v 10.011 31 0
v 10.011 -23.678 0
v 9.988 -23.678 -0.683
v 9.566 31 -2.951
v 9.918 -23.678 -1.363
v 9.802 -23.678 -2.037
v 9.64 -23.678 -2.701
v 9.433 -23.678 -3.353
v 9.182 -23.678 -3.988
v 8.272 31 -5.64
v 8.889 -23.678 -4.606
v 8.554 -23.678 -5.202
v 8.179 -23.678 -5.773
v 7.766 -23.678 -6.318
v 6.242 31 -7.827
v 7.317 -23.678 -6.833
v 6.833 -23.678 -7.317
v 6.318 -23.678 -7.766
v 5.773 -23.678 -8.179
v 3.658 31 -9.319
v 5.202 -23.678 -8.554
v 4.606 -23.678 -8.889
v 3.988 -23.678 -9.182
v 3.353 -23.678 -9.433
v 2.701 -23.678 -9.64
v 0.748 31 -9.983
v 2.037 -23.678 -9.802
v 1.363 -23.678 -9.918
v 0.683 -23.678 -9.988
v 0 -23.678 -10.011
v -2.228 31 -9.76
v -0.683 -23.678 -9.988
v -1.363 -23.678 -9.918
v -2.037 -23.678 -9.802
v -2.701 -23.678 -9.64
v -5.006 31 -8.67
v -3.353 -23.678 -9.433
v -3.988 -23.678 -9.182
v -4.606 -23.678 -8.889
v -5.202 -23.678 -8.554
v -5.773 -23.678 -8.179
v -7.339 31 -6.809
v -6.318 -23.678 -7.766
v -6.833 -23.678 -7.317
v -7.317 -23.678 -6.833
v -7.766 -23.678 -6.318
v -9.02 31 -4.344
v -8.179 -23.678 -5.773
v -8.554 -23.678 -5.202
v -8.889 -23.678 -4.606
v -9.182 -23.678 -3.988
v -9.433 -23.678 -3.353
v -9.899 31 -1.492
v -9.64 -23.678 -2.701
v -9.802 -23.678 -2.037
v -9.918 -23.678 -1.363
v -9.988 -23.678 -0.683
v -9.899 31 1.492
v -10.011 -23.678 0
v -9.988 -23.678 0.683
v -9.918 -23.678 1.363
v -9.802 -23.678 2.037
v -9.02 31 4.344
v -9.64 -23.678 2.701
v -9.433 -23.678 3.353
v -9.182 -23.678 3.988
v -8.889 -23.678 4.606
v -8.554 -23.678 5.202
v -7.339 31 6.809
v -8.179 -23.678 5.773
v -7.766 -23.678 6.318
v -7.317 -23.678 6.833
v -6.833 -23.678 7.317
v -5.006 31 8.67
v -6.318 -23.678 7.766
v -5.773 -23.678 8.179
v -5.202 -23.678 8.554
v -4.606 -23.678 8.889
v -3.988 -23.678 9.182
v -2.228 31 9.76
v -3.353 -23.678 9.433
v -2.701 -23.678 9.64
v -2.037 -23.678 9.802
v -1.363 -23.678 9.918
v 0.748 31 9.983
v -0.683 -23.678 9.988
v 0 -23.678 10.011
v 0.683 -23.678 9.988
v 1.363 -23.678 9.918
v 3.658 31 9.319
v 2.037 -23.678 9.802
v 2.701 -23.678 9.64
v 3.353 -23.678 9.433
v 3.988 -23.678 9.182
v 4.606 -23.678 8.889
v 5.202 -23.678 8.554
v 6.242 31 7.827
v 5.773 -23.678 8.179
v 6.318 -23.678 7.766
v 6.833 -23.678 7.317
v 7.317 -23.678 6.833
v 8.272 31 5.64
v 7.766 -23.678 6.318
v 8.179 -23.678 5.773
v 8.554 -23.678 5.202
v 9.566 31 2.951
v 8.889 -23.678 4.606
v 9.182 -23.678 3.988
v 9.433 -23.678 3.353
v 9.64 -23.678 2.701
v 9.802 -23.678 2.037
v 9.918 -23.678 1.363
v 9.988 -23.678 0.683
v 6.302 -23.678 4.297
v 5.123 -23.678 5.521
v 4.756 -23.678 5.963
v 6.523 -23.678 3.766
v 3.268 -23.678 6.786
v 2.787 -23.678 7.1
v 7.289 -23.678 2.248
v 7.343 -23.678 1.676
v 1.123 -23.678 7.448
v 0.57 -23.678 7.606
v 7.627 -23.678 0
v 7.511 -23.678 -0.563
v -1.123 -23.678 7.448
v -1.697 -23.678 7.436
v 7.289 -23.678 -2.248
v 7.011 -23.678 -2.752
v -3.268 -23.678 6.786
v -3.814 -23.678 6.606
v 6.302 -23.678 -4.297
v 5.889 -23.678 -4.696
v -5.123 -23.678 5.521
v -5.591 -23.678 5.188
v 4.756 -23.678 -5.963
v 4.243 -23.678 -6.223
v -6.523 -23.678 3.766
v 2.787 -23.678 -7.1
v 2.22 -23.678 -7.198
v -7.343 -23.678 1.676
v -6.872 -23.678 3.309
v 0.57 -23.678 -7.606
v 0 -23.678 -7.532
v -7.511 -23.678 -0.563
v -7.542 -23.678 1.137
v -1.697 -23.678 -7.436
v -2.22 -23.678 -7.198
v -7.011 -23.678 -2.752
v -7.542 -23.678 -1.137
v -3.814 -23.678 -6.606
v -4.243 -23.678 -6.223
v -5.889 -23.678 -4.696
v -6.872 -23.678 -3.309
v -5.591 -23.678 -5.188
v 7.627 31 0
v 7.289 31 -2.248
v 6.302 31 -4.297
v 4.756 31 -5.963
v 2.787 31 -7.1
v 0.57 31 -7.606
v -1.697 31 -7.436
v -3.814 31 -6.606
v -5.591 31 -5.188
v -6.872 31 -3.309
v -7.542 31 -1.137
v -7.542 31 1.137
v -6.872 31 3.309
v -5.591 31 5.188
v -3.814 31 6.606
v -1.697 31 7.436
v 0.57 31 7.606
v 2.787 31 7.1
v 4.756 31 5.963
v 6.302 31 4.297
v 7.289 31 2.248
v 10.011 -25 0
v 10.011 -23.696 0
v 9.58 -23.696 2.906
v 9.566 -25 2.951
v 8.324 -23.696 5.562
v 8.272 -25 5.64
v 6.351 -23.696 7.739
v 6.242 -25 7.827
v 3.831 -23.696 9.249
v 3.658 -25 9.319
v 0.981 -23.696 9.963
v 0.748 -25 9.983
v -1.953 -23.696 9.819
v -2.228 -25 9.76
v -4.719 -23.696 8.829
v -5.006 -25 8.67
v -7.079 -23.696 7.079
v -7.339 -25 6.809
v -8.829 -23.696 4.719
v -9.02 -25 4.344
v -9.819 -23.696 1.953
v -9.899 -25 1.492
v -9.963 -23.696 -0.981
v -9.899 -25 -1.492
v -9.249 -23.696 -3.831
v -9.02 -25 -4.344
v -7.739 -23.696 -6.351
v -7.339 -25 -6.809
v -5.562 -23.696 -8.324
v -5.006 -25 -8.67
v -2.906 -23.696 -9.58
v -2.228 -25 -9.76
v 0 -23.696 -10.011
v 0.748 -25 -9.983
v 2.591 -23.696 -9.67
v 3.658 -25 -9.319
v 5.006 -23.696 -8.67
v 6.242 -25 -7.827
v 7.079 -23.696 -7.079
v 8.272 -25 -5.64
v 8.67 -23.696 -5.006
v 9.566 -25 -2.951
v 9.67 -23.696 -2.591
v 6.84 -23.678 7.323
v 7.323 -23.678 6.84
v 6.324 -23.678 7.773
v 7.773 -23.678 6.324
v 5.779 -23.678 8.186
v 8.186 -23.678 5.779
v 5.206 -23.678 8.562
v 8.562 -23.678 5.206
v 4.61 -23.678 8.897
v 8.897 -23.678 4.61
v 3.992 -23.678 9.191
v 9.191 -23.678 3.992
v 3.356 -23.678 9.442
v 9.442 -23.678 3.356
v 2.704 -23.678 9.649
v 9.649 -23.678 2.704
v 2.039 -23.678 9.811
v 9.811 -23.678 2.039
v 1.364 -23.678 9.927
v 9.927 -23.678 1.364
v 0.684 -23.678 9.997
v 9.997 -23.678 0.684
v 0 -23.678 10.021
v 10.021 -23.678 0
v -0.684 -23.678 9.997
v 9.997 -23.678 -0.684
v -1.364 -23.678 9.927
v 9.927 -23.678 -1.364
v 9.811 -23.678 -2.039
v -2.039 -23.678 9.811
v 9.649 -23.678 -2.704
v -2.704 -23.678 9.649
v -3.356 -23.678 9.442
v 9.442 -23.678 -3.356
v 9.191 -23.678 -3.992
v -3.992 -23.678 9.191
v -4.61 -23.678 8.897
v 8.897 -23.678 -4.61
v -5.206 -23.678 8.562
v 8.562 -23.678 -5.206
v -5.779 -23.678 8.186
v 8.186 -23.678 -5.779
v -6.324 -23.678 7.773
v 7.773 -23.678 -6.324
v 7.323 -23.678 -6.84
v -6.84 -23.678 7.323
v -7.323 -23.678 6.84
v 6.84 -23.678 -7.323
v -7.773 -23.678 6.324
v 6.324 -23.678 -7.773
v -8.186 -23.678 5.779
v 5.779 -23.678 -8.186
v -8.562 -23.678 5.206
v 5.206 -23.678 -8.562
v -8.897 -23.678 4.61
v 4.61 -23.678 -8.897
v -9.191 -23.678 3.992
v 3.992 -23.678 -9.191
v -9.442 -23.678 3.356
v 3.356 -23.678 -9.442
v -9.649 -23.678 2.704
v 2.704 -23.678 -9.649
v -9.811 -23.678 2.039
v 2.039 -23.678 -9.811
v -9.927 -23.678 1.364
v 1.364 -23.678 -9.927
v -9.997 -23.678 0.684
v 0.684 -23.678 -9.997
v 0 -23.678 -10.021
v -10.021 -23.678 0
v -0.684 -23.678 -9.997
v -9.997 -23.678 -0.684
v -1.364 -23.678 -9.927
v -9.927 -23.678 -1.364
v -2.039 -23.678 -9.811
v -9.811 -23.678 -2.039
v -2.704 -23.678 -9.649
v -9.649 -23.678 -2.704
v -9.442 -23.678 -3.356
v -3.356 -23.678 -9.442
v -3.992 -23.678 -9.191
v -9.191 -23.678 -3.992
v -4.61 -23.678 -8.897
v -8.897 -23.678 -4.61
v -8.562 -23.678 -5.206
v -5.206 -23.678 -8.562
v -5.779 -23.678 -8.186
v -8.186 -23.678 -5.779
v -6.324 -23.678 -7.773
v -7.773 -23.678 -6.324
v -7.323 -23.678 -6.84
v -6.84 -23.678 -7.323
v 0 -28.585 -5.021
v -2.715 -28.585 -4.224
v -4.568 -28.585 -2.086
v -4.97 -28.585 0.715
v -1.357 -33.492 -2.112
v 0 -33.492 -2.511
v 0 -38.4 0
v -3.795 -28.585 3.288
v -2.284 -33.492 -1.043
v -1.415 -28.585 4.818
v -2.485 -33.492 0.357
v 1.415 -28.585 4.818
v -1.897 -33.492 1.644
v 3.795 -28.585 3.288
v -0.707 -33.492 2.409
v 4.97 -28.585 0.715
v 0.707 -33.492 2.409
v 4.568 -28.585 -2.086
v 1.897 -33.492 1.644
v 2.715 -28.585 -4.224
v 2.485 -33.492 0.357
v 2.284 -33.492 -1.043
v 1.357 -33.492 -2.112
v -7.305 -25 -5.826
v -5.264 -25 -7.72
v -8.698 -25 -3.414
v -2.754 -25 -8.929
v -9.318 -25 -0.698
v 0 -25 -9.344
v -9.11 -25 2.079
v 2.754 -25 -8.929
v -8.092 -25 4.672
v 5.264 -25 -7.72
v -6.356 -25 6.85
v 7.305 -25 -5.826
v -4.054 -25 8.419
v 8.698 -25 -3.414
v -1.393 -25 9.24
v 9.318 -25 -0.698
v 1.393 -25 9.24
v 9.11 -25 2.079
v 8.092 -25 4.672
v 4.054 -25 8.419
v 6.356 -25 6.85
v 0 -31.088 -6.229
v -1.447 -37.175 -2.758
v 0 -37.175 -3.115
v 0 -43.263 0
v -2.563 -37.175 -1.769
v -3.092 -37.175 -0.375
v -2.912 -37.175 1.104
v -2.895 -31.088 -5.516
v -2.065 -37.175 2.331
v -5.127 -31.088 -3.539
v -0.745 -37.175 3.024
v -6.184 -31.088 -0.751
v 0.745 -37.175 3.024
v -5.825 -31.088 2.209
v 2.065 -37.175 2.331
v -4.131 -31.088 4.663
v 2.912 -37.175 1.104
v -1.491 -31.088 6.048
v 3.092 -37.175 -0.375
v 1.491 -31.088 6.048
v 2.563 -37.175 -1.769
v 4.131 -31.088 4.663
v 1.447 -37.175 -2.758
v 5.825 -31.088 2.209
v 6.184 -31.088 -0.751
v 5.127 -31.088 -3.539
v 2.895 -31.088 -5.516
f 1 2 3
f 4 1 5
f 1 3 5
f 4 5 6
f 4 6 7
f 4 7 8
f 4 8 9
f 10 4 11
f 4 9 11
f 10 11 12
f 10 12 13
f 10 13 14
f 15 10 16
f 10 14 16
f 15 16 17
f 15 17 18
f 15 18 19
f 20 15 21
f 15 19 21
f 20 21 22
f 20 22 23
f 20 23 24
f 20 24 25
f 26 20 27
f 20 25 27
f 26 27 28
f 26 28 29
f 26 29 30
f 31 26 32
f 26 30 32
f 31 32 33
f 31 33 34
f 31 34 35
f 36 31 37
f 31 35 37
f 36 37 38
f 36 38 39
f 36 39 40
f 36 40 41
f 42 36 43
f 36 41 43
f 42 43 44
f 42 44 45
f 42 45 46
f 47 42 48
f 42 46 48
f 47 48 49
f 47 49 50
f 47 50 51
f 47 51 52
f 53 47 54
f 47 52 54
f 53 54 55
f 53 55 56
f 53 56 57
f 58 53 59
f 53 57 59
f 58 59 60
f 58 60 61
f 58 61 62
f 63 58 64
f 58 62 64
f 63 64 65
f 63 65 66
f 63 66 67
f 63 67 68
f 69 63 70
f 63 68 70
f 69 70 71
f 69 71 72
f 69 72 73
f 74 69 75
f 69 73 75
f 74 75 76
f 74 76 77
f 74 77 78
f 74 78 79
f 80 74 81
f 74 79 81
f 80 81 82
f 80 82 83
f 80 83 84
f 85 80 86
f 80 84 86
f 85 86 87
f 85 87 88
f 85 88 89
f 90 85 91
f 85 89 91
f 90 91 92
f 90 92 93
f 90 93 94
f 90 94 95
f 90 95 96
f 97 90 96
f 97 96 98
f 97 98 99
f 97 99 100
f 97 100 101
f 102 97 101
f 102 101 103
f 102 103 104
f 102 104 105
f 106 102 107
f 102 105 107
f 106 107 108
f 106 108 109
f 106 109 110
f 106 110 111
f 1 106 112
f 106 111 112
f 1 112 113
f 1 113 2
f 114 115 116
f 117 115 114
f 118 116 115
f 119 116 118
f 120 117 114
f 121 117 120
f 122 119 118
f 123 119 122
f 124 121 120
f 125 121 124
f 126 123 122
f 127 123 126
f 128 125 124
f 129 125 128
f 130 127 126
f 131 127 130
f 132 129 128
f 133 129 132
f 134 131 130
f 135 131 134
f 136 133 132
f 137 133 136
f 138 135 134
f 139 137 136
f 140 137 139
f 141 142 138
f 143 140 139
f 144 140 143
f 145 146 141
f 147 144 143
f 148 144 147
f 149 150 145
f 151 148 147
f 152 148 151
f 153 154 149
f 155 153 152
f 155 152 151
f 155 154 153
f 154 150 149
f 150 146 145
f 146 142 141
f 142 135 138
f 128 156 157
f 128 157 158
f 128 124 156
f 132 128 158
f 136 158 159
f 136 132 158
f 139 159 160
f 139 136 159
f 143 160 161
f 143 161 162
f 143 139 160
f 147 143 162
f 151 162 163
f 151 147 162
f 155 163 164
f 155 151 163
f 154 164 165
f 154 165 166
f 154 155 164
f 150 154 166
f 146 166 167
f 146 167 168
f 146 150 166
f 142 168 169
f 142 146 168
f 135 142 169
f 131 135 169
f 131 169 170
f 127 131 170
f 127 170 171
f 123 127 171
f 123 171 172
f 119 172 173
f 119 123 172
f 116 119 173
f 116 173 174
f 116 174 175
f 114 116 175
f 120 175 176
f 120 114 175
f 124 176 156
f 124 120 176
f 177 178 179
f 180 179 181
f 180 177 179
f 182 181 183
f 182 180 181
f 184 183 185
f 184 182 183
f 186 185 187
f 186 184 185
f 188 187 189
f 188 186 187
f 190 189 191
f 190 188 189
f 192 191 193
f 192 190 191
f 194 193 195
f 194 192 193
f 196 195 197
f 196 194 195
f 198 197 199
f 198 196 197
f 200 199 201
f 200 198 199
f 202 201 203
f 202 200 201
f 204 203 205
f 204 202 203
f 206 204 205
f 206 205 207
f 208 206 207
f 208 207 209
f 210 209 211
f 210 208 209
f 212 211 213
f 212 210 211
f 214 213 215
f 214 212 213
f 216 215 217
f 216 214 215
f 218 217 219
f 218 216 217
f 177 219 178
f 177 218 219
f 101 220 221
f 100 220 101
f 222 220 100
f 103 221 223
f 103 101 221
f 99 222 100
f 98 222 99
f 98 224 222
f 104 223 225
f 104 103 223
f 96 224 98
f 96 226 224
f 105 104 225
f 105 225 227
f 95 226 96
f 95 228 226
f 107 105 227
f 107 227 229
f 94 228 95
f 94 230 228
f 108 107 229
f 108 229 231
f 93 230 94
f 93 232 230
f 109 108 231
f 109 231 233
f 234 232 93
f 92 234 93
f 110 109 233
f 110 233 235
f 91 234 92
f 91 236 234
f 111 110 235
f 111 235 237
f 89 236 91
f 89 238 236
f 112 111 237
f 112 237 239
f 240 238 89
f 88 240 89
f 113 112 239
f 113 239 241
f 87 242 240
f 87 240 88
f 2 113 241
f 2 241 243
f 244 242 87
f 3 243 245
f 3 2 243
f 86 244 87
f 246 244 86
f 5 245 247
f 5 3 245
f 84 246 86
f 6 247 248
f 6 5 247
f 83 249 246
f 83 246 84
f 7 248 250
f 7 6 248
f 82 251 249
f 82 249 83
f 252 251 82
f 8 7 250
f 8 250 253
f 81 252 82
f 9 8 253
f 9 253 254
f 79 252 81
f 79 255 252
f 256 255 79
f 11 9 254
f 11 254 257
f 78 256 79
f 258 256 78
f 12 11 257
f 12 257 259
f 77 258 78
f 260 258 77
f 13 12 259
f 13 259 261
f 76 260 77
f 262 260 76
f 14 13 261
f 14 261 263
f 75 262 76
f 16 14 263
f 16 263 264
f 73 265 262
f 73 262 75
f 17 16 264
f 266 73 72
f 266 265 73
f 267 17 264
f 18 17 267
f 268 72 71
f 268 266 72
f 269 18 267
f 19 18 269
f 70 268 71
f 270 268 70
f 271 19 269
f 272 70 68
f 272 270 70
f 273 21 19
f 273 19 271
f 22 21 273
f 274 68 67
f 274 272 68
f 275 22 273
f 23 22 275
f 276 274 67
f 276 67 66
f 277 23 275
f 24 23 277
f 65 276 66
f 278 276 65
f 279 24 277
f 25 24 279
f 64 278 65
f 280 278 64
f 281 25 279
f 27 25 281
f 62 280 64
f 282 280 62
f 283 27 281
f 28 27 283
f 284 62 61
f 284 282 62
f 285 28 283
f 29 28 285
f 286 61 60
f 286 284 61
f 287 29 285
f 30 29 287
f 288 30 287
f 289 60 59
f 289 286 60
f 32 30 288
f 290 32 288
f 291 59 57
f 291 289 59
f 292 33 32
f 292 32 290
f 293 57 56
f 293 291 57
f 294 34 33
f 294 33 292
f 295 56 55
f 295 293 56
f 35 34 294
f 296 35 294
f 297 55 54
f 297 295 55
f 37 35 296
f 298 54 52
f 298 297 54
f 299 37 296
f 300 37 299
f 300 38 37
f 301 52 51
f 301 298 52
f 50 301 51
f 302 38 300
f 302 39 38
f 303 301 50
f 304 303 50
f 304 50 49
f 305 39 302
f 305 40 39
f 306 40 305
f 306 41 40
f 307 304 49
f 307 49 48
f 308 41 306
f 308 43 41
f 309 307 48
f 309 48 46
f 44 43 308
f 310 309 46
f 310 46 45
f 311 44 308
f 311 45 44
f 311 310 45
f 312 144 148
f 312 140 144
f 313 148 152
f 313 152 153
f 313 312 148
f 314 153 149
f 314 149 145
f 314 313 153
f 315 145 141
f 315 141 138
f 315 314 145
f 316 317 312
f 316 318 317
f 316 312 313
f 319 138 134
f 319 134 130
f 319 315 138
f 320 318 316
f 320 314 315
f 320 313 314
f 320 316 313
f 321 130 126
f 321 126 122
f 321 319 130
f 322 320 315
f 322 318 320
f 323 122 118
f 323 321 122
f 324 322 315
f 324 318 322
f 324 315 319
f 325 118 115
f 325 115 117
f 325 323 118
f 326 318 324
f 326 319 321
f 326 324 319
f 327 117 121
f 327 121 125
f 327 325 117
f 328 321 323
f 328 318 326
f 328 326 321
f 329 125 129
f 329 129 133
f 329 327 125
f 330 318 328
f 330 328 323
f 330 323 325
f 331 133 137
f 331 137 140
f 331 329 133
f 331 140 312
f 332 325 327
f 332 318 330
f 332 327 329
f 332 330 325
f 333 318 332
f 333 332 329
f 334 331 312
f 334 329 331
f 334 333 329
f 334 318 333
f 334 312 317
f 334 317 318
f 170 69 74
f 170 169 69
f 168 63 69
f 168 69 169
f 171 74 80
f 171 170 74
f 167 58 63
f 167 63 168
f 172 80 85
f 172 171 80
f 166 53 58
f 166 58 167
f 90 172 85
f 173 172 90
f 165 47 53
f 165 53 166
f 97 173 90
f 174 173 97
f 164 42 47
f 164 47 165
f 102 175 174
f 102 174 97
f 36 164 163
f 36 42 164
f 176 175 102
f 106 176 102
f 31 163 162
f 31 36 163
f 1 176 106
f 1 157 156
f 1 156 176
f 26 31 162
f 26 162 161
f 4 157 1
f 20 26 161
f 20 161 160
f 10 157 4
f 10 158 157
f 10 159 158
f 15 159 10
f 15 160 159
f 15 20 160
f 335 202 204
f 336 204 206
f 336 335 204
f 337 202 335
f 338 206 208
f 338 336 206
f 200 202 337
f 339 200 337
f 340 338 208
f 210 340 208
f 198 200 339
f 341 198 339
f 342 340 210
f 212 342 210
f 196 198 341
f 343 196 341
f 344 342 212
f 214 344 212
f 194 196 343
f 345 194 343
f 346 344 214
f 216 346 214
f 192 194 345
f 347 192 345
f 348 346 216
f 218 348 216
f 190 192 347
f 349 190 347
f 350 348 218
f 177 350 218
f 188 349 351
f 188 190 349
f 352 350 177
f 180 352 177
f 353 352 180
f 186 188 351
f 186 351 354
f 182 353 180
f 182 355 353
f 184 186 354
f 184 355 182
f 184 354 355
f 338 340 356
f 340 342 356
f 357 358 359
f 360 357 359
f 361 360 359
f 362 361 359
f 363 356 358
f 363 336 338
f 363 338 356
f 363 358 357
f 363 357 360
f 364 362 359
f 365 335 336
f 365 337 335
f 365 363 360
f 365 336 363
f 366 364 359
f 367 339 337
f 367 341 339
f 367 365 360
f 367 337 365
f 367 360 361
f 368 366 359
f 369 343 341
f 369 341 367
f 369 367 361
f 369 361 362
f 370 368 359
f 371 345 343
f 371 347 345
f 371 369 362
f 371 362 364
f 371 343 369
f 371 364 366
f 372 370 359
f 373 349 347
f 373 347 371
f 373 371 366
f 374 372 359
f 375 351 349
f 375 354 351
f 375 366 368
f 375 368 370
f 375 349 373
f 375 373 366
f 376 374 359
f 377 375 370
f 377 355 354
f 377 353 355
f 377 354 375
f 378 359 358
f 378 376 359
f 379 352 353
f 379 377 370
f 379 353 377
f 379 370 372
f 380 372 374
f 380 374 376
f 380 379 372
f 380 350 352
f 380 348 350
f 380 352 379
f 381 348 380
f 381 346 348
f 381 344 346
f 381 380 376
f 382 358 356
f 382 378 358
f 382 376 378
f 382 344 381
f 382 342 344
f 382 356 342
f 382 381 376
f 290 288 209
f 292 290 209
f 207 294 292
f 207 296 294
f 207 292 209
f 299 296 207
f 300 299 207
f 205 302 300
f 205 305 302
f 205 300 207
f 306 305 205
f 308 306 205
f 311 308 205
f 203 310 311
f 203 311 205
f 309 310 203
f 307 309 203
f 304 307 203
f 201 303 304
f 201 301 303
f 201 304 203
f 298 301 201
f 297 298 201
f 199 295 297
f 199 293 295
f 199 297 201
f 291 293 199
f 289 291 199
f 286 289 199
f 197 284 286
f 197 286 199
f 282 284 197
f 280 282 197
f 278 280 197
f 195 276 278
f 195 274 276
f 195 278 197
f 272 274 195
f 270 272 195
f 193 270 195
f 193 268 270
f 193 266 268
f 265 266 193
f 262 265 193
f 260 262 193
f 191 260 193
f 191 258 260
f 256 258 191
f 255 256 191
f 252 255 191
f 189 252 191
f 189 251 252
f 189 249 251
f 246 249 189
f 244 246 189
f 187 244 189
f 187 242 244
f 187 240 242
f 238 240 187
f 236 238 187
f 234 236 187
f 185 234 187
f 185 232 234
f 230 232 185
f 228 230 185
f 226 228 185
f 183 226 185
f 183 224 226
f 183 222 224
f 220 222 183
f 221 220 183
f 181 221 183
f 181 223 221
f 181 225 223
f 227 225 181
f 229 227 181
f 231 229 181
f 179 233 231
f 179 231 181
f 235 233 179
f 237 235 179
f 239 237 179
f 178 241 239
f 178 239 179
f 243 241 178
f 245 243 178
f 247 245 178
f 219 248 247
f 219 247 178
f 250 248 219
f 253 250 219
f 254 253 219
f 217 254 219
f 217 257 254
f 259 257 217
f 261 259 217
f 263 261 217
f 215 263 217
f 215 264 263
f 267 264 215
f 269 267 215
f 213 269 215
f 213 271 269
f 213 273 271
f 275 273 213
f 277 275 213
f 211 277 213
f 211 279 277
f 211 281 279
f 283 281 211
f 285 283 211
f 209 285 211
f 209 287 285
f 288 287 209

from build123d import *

# Parameters (mm, degrees)
F0_R        = 10.011227
F0_R_2      = 7.627377
F2_DEPTH    = 25
F2_FACE_R   = 10.011227
F2_FACE_R_2 = 7.627377
F5_DEPTH    = 6


with BuildPart() as f2:
    # F0 (on Front) → F2 (new body, symmetric)
    with BuildSketch(Plane.XZ):
        Circle(F0_R)
        Circle(F0_R_2, mode=Mode.SUBTRACT)
    extrude(amount=F2_DEPTH, both=True)

    # F3 (on Right) → F4 (revolve)
    with BuildSketch(Plane.YZ):
        Polygon((-23.677679, -10.02051), (-23.677679, -7.532166), (-38.399562, 0), (-43.263118, 0), align=None)
    revolve(axis=Axis((0, -31.038621, 0), (0, 1, 0)))

    # F2_face (on face) → F5 (join)
    with BuildSketch(Plane(origin=(0, 25, 0), x_dir=(1, 0, 0), z_dir=(0, 1, 0))):
        Circle(F2_FACE_R)
        Circle(F2_FACE_R_2, mode=Mode.SUBTRACT)
    extrude(amount=F5_DEPTH)


solid = f2.part
